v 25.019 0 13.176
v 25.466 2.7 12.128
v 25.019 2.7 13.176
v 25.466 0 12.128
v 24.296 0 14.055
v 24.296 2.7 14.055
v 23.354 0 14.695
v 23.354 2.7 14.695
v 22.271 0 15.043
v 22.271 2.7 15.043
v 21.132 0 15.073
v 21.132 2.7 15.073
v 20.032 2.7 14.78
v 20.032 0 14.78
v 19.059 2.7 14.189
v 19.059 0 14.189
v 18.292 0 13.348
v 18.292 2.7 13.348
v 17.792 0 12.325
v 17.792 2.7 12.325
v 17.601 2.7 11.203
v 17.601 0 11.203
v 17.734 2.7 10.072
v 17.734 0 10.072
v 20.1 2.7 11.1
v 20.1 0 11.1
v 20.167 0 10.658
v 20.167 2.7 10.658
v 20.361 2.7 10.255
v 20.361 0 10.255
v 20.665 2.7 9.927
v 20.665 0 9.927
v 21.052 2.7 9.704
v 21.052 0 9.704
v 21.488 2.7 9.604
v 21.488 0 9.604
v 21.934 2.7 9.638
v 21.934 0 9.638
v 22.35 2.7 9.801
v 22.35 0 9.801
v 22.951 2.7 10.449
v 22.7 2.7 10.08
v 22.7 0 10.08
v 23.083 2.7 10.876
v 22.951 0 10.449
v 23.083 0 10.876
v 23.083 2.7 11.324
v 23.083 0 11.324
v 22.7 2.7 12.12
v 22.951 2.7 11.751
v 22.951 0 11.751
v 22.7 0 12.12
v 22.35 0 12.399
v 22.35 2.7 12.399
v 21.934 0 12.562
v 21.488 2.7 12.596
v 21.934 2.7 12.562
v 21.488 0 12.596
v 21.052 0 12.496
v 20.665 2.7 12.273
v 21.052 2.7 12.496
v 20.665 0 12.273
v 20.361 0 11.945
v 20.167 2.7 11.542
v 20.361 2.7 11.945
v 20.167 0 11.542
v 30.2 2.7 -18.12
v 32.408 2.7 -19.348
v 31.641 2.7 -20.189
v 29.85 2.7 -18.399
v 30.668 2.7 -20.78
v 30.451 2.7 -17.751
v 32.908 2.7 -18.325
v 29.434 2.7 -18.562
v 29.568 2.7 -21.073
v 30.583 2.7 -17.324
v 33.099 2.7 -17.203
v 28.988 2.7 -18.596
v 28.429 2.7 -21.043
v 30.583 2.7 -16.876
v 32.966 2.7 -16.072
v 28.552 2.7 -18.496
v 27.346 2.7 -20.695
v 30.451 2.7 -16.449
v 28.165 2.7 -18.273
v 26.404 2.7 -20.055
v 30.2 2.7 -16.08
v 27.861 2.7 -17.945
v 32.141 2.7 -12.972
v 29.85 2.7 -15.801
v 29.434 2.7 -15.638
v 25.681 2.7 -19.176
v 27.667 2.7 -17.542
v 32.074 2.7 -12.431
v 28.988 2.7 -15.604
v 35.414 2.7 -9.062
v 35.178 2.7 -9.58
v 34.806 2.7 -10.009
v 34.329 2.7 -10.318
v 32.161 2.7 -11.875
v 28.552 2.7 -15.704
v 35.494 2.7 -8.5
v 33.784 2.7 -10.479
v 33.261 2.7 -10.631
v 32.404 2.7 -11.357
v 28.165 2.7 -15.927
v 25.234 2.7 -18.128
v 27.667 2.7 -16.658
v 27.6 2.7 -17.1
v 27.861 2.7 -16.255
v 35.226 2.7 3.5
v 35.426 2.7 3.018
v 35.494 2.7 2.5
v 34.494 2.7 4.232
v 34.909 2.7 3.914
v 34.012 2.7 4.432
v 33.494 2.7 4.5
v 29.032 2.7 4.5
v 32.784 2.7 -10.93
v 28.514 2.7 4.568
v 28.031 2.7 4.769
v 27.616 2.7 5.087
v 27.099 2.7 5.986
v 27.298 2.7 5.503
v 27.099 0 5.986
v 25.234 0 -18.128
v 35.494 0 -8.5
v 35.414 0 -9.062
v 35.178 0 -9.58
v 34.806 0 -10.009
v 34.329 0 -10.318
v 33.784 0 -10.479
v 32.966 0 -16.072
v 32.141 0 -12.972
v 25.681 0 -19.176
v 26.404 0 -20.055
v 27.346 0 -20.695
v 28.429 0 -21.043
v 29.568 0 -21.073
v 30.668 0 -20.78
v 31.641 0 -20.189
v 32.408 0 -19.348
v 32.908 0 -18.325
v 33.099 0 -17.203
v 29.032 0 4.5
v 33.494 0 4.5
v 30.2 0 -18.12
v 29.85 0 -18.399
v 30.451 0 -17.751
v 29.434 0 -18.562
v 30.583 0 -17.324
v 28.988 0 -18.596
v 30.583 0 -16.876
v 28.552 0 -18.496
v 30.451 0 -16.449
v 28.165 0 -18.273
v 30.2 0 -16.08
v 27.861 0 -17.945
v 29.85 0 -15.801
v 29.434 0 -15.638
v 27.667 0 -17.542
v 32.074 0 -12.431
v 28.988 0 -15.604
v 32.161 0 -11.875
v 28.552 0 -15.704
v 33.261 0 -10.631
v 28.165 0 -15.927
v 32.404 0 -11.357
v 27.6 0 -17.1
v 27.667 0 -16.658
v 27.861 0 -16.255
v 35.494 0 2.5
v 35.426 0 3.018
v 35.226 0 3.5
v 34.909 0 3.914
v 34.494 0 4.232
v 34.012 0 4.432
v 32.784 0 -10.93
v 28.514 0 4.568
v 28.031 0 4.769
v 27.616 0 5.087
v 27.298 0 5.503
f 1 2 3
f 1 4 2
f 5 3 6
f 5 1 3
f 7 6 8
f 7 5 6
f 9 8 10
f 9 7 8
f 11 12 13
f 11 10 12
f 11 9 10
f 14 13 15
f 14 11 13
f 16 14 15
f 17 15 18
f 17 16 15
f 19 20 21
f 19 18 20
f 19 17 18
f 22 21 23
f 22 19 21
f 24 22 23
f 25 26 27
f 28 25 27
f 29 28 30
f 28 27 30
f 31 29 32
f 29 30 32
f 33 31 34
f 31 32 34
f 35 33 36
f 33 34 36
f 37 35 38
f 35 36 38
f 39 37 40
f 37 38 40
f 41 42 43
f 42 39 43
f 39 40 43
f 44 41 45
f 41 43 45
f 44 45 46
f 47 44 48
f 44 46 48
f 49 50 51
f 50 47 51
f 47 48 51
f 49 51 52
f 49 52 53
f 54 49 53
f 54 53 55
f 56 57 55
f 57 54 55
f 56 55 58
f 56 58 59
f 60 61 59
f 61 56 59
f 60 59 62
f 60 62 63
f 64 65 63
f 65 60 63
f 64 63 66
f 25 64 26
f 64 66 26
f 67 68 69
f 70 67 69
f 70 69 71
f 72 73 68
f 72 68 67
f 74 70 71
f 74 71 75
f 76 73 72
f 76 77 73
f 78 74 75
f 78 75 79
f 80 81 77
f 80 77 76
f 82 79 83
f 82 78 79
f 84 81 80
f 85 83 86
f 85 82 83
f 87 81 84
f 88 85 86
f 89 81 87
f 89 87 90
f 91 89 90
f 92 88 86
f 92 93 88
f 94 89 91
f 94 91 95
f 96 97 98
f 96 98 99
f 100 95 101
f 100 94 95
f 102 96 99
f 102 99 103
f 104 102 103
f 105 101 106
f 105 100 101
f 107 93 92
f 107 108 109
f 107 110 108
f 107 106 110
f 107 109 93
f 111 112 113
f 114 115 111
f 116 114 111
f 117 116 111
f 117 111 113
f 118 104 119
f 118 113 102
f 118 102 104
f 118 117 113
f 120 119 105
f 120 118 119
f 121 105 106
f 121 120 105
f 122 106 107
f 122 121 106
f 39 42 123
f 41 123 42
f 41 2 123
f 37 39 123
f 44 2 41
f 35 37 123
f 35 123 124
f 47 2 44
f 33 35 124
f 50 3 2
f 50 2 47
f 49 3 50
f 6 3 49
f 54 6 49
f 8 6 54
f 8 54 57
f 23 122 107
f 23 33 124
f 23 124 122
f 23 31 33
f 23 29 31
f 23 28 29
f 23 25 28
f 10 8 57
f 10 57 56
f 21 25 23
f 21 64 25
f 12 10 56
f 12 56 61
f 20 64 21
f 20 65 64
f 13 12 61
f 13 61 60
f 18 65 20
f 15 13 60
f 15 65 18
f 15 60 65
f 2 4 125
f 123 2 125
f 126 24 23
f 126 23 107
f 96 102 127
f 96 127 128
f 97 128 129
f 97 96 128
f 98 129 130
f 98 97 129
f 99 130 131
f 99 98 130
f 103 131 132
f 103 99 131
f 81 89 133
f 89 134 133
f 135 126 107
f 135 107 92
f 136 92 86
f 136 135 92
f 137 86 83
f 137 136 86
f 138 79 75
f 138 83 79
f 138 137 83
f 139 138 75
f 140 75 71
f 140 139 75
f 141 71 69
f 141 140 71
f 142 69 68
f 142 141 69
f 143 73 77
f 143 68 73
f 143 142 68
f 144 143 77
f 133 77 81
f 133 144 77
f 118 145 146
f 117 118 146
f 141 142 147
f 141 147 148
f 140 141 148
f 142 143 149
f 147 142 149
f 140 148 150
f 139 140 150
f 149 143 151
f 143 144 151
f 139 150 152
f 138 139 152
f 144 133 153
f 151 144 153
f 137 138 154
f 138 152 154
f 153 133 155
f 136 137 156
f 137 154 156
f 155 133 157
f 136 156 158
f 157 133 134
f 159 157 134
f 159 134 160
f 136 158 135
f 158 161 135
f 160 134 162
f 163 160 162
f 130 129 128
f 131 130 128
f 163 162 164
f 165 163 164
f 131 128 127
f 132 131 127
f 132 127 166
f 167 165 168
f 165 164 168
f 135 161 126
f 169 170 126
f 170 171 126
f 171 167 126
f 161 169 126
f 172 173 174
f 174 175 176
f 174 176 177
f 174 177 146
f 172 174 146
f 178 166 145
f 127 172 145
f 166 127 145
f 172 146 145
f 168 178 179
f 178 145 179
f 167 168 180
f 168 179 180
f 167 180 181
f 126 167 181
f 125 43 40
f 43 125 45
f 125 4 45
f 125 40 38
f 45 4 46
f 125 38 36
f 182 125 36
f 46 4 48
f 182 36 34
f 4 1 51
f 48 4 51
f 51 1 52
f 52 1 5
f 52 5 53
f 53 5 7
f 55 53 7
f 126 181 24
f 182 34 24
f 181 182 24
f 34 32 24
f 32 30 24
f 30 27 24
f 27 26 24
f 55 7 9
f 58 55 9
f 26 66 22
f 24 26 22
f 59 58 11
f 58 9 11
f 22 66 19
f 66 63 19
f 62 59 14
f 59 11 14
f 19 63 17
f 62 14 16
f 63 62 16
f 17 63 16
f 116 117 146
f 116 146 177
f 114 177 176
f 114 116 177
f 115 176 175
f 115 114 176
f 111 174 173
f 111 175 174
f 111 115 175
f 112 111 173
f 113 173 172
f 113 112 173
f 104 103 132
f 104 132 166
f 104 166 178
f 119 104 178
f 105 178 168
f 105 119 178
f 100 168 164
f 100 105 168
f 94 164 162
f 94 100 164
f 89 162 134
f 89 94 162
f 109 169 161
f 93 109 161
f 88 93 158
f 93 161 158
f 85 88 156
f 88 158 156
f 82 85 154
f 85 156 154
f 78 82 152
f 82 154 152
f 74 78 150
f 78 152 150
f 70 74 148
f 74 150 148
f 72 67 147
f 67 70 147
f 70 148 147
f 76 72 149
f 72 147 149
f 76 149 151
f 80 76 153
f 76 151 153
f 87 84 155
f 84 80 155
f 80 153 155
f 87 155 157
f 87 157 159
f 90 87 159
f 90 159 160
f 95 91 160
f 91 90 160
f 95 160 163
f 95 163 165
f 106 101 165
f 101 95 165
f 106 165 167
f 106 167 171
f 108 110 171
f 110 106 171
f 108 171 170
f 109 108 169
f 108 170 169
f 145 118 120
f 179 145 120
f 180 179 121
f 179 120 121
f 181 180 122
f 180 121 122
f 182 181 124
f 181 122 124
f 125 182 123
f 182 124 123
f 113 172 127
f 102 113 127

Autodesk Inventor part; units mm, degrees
ref_plane "YZ Plane" through (0, 0, 0) normal (1, 0, 0) x (0, 1, 0)
ref_plane "XZ Plane" through (0, 0, 0) normal (0, 1, 0) x (-1, 0, 0)
ref_plane "XY Plane" through (0, 0, 0) normal (0, 0, 1) x (1, 0, 0)
sketch "Sketch1" plane through (0, 0, 0) normal (0, 1, 0) x (-1, 0, 0)
  line L0 (0, -3) -> (-10, -3)
  circle A0 centre (-21.6, 11.1) radius 1.5
  line L1 (0, 35) -> (-45, 35)
  line L2 (0, 0) -> (0, 35)
  circle A1 centre (-29.1, -17.1) radius 1.5
  arc A2 (-17.7344, 10.0719) -> (-25.4656, 12.1281) centre (-21.6, 11.1) ccw
  arc A3 (-32.9656, -16.0719) -> (-25.2344, -18.1281) centre (-29.1, -17.1) ccw
  line L3 (-17.7344, 10.0719) -> (-25.2344, -18.1281)
  line L4 (-27.4944, 4.5) -> (-35.4944, 4.5)
  line L5 (-35.4944, 4.5) -> (-35.4944, -10.5)
  line L6 (-35.4944, -10.5) -> (-31.4837, -10.5)
  line L7 (-25.4656, 12.1281) -> (-27.4944, 4.5)
  line L8 (-31.4837, -10.5) -> (-32.9656, -16.0719)
  point P0 (-35.4944, -3)
  dimension "d0" = 10
  dimension "d1" = 3
  dimension "d2" = 14.1
  dimension "d3" = 3
  dimension "d7" = 45
  dimension "d8" = 35
  dimension "d9" = 23.4
  dimension "d10" = 3
  dimension "d11" = 14.1
  dimension "d12" = 15.9
  dimension "d13" = 2.5
  dimension "d14" = 2.5
  dimension "d15" = 15
  dimension "d16" = 8
extrude "Extrusion1" add sketch "Sketch1" along normal blind 2.7
fillet "Fillet1" radius 2 4 edges at (35.4944, 1.35, 4.5) (27.4944, 1.35, 4.5) (35.4944, 1.35, -10.5) (31.4837, 1.35, -10.5)
properties part number "SujecionServo"
